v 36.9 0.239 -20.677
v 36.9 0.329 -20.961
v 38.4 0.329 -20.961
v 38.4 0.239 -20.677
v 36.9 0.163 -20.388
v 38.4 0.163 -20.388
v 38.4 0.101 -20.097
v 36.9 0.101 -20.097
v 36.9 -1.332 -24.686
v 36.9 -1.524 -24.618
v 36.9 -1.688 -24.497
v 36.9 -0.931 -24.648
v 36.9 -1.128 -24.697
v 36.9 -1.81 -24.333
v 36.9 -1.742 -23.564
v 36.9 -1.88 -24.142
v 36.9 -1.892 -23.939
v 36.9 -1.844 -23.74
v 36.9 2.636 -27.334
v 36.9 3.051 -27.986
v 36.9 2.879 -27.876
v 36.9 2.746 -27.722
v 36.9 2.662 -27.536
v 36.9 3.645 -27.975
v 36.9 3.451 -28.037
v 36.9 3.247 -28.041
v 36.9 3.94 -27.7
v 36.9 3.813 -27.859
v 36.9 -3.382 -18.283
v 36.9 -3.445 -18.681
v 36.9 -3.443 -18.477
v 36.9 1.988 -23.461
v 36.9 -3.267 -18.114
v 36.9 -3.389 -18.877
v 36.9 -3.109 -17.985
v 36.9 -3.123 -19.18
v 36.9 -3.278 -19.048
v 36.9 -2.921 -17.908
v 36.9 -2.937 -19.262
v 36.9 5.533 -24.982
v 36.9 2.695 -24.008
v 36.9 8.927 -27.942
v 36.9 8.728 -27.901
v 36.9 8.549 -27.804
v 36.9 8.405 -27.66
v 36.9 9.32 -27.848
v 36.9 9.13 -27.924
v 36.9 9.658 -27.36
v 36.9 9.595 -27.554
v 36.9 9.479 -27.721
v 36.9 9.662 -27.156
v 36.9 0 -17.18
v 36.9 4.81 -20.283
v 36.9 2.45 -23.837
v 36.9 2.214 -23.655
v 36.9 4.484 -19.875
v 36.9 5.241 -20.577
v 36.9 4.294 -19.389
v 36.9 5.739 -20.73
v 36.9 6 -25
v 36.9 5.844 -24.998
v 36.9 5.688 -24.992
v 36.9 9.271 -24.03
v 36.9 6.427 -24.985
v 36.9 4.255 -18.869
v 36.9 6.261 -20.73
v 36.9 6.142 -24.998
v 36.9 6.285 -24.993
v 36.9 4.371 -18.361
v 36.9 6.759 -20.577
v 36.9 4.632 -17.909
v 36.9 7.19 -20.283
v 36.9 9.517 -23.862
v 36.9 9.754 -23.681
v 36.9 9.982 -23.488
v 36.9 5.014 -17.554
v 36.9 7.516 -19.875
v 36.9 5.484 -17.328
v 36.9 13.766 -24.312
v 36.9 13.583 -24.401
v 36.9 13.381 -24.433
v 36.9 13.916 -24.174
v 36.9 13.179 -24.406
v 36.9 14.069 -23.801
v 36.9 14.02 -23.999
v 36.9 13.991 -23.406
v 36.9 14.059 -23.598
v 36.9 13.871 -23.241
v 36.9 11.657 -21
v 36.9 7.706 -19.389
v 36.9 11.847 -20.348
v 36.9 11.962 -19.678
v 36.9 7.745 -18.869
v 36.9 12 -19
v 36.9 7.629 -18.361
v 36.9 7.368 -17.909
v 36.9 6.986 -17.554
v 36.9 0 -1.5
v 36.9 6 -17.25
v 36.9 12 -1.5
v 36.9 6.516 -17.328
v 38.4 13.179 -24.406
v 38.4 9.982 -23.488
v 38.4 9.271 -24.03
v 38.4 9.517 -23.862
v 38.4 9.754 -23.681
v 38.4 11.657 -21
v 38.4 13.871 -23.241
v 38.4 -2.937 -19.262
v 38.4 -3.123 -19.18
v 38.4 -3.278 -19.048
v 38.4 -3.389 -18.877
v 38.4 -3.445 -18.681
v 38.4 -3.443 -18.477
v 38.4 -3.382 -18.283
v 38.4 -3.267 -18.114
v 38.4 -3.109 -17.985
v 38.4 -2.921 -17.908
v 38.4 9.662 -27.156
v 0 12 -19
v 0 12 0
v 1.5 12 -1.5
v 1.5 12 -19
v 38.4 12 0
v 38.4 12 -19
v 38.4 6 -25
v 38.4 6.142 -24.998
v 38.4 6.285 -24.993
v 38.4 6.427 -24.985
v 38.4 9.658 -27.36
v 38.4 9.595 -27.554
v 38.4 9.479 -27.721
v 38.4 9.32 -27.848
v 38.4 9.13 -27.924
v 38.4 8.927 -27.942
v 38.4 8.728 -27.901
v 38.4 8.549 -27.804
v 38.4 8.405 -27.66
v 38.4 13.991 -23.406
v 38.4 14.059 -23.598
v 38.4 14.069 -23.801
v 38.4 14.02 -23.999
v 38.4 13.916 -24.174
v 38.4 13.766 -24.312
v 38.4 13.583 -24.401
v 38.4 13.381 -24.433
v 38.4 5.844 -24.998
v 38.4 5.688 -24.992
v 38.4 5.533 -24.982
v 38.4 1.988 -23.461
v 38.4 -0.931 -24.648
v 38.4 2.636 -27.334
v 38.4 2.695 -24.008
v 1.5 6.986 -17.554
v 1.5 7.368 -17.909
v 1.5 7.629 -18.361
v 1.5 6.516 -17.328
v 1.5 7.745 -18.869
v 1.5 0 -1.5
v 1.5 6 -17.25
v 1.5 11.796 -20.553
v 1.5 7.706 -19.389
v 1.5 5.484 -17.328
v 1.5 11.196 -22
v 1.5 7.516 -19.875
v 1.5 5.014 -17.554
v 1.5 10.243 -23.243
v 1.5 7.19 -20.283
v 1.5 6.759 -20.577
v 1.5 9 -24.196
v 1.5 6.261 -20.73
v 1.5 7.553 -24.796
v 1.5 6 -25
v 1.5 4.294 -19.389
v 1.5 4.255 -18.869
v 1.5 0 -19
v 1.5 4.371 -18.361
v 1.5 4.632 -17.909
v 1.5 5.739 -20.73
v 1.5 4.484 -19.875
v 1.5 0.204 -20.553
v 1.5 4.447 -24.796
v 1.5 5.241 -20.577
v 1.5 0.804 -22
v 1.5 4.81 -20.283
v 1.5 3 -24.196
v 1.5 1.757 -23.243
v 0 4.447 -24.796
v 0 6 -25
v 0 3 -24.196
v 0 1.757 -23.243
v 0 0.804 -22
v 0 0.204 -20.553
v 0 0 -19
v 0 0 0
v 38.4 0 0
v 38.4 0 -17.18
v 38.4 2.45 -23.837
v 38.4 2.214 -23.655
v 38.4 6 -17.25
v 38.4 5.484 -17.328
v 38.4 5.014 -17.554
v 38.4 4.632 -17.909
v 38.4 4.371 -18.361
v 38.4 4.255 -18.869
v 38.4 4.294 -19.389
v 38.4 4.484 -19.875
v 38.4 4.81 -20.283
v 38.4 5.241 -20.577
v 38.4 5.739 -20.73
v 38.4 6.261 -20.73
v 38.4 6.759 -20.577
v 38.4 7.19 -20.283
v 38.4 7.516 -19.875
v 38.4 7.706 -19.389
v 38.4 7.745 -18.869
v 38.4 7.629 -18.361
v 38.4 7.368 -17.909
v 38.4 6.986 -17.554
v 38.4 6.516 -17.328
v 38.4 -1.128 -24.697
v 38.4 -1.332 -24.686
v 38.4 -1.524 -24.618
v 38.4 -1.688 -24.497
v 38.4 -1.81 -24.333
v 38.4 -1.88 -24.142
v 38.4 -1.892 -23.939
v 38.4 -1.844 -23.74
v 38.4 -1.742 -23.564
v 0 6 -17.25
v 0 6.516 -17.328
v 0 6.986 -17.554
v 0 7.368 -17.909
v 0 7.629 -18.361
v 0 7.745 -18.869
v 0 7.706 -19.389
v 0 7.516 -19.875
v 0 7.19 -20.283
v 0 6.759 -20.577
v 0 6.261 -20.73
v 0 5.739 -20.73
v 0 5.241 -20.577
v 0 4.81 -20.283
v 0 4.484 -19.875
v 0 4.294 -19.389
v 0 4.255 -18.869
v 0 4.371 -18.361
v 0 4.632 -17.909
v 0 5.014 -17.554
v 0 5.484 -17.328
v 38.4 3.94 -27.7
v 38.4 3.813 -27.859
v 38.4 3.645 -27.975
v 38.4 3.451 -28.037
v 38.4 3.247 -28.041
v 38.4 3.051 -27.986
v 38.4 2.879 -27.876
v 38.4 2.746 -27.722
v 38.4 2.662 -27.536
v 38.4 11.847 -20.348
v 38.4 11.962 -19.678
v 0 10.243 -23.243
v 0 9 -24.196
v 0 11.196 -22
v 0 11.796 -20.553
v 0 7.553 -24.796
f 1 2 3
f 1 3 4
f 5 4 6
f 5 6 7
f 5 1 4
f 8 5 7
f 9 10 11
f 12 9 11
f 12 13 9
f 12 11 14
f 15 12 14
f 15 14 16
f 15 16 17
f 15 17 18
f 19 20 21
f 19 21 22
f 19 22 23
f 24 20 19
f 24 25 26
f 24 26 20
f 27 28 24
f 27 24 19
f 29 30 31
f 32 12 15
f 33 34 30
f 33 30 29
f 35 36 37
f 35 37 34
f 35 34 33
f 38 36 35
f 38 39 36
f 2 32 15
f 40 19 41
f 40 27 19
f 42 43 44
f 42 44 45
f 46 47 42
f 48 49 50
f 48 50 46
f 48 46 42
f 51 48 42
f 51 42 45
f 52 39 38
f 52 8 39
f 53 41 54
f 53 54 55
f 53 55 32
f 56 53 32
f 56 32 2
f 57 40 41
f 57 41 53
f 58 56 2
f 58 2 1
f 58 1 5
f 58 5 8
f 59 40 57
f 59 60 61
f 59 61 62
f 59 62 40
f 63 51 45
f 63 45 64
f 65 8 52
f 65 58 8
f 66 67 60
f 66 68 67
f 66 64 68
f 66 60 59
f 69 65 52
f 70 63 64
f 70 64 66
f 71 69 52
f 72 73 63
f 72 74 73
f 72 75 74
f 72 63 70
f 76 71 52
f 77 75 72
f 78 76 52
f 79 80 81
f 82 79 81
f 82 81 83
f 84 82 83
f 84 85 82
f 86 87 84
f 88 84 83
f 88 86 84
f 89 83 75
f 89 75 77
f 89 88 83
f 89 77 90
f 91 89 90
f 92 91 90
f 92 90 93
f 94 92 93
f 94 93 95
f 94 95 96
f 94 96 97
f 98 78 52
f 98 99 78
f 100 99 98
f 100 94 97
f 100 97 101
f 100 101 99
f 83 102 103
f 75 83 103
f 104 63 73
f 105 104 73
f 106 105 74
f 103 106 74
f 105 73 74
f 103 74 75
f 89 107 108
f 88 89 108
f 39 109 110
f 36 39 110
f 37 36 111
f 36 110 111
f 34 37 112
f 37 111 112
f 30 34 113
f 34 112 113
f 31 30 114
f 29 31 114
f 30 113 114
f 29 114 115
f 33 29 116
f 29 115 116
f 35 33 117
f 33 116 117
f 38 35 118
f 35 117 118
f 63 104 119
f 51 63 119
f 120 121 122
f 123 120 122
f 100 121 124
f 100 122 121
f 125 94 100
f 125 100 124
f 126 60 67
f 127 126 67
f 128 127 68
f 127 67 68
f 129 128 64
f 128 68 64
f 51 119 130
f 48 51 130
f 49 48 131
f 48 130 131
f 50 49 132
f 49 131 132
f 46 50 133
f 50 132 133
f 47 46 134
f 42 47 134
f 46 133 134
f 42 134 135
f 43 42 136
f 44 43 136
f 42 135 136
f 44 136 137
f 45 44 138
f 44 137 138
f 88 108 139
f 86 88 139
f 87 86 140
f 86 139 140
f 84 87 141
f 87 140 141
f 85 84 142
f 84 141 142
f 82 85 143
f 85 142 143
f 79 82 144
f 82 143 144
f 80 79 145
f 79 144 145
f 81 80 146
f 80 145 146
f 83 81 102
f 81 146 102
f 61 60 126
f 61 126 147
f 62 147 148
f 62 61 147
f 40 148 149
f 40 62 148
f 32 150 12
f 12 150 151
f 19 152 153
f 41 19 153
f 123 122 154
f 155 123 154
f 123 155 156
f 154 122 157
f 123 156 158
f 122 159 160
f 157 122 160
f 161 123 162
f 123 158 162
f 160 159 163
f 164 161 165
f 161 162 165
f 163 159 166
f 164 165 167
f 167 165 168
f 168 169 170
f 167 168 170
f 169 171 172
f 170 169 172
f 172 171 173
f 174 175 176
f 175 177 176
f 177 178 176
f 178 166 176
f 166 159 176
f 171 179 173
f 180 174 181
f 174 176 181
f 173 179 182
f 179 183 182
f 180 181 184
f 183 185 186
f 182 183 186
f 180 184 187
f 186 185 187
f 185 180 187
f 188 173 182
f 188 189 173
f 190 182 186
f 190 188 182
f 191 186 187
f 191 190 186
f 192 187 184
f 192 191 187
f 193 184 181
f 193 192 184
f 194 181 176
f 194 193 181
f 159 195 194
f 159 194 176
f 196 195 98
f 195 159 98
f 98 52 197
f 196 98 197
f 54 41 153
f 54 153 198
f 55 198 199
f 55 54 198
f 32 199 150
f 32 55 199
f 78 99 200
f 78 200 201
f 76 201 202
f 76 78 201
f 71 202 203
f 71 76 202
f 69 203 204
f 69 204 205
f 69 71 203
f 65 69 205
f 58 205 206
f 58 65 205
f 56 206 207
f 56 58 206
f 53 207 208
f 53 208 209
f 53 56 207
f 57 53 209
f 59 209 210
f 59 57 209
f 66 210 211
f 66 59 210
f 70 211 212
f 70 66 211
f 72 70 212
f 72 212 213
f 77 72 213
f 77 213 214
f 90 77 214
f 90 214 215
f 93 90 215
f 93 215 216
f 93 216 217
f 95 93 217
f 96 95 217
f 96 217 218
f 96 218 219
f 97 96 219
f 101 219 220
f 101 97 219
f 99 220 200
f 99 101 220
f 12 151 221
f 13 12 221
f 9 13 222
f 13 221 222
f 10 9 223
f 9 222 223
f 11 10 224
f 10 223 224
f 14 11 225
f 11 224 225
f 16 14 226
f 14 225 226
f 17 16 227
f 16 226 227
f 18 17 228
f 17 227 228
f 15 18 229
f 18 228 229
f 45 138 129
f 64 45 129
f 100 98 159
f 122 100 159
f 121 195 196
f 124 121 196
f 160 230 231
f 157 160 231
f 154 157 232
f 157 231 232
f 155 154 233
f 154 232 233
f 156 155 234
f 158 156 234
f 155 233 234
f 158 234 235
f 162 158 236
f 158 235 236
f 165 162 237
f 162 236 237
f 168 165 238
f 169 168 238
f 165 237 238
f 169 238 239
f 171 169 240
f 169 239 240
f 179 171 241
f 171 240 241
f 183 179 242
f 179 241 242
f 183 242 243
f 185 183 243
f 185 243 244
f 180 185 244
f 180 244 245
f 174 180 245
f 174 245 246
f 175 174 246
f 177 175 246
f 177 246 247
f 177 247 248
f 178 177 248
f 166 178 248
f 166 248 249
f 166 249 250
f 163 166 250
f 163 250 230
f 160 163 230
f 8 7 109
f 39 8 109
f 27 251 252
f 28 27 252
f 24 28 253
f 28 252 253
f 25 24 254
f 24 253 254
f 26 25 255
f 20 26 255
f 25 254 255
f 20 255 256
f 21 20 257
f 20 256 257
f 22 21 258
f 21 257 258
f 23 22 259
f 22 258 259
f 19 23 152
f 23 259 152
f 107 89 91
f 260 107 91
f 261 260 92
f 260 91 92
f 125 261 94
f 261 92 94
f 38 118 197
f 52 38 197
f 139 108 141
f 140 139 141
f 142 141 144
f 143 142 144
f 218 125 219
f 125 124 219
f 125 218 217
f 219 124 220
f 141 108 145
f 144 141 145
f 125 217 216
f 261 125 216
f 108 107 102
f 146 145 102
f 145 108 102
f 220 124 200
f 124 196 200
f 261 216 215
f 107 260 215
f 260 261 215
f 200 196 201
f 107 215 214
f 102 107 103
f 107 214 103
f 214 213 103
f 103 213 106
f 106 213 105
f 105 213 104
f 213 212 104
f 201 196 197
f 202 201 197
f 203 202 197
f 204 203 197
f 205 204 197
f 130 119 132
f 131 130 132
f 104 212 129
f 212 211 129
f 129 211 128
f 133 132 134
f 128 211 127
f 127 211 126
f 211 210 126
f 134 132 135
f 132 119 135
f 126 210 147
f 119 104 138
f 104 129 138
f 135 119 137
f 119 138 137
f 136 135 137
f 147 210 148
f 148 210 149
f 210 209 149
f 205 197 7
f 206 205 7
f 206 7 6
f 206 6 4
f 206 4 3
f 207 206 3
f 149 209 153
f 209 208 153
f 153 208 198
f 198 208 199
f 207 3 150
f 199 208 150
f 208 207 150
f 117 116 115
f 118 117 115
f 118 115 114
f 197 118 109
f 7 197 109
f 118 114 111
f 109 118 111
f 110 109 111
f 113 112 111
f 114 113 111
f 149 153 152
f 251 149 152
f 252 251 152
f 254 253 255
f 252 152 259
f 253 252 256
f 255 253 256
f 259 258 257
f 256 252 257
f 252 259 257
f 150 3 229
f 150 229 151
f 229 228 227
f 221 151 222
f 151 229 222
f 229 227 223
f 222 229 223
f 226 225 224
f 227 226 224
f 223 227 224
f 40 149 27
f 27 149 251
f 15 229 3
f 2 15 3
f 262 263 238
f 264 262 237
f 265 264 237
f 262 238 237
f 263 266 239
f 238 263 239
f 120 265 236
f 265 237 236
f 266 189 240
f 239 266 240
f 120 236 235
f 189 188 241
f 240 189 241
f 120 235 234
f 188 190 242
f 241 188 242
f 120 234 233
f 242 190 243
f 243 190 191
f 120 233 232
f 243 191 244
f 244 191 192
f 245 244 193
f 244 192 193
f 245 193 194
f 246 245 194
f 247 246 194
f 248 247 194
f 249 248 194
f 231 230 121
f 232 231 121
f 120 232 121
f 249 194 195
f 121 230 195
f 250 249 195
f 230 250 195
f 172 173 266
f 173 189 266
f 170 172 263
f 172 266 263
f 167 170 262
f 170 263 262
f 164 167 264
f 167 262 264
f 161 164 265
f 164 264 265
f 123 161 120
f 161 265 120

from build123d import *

# Parameters (mm, degrees)
EXTRUDE_2_DEPTH     = 12
FILLET_1_R          = 6
CUT_EXTRUDE_3_REACH = 49.366
SKETCH_5_R          = 1.75
CUT_EXTRUDE_START   = -1.5
SKETCH_6_R          = 1.75
CUT_EXTRUDE_4_DEPTH = 1.5
EXTRUDE_3_DEPTH     = 1.5


with BuildPart() as part:
    # 草图2 → 凸台-拉伸2 (new body)
    with BuildSketch(Plane(origin=(0, 0, 0), x_dir=(1, 0, 0), z_dir=(0, 1, 0))):
        Polygon((0, 0), (38.4, 0), (38.4, 25), (36.9, 25), (36.9, 1.5), (1.5, 1.5), (1.5, 25), (0, 25), align=None)
    extrude(amount=EXTRUDE_2_DEPTH)

    # 圆角1
    fillet_1_edges = [part.edges().sort_by_distance(p)[0] for p in [
        (0.75, 0, -25),
        (0.75, 12, -25),
        (37.65, 0, -25),
        (37.65, 12, -25),
    ]]
    fillet(fillet_1_edges, radius=FILLET_1_R - 0.0001)  # a hair under: the kernel refuses the full size

    # 草图5 → 切除-拉伸3 (cut, up to next)
    with BuildSketch(Plane.ZY, mode=Mode.PRIVATE) as cut_extrude_3_sk1:
        with Locations((-19, 6)):
            Circle(SKETCH_5_R)
    cut_extrude_3_tool1 = extrude(cut_extrude_3_sk1.sketch, amount=-CUT_EXTRUDE_3_REACH, mode=Mode.PRIVATE) & part.part
    add(cut_extrude_3_tool1.solids().sort_by_distance((0, 6, -19))[0], mode=Mode.SUBTRACT)

    # 草图6 → 切除-拉伸4 (cut)
    with BuildSketch(Plane(origin=(38.4, 0, 0), x_dir=(0, 0, -1), z_dir=(1, 0, 0)).offset(CUT_EXTRUDE_START)):
        with Locations(Location((19, 6, 0), (0, 0, 180))):
            Circle(SKETCH_6_R)
    extrude(amount=CUT_EXTRUDE_4_DEPTH, mode=Mode.SUBTRACT)

    # 草图7 → 凸台-拉伸3 (add)
    with BuildSketch(Plane(origin=(38.4, 0, 0), x_dir=(0, 0, -1), z_dir=(1, 0, 0))):
        with BuildLine():
            Line((20.999709003, 11.656957124), (23.241440486, 13.870627343))
            ThreePointArc((23.241440486, 13.870627343), (24.09053112, 13.974522864), (24.406127138, 13.179445297))
            Line((24.406127138, 13.179445297), (23.488407969, 9.981732526))
            ThreePointArc((23.488407969, 9.981732526), (22.350449197, 10.977397932), (20.999709003, 11.656957124))
        make_face()
        with BuildLine():
            Line((27.659538401, 8.404795226), (24.984818637, 6.42655115))
            ThreePointArc((24.984818637, 6.42655115), (24.68813794, 7.909211035), (24.03021312, 9.27062012))
            Line((24.03021312, 9.27062012), (27.156295325, 9.662163121))
            ThreePointArc((27.156295325, 9.662163121), (27.893171802, 9.227695353), (27.659538401, 8.404795226))
        make_face()
        with BuildLine():
            Line((27.334020294, 2.636259354), (24.007743744, 2.695079034))
            ThreePointArc((24.007743744, 2.695079034), (24.674957273, 4.051959971), (24.981763759, 5.53255767))
            Line((24.981763759, 5.53255767), (27.700207796, 3.940151347))
            ThreePointArc((27.700207796, 3.940151347), (28.02032399, 3.146882915), (27.334020294, 2.636259354))
        make_face()
        with BuildLine():
            Line((23.564107276, -1.742064981), (20.961001817, 0.329508674))
            ThreePointArc((20.961001817, 0.329508674), (22.316354676, 0.999820837), (23.461091399, 1.987686013))
            Line((23.461091399, 1.987686013), (24.648382507, -0.93053874))
            ThreePointArc((24.648382507, -0.93053874), (24.419436534, -1.754755292), (23.564107276, -1.742064981))
        make_face()
        with BuildLine():
            Line((17.907879211, -2.920645581), (17.103790939, 0.307514497))
            ThreePointArc((17.103790939, 0.307514497), (18.587124847, 0.014222347), (20.096679766, 0.101076921))
            Line((20.096679766, 0.101076921), (19.262118462, -2.936883465))
            ThreePointArc((19.262118462, -2.936883465), (18.578732164, -3.451404943), (17.907879211, -2.920645581))
        make_face()
    extrude(amount=-EXTRUDE_3_DEPTH)


solid = part.part
